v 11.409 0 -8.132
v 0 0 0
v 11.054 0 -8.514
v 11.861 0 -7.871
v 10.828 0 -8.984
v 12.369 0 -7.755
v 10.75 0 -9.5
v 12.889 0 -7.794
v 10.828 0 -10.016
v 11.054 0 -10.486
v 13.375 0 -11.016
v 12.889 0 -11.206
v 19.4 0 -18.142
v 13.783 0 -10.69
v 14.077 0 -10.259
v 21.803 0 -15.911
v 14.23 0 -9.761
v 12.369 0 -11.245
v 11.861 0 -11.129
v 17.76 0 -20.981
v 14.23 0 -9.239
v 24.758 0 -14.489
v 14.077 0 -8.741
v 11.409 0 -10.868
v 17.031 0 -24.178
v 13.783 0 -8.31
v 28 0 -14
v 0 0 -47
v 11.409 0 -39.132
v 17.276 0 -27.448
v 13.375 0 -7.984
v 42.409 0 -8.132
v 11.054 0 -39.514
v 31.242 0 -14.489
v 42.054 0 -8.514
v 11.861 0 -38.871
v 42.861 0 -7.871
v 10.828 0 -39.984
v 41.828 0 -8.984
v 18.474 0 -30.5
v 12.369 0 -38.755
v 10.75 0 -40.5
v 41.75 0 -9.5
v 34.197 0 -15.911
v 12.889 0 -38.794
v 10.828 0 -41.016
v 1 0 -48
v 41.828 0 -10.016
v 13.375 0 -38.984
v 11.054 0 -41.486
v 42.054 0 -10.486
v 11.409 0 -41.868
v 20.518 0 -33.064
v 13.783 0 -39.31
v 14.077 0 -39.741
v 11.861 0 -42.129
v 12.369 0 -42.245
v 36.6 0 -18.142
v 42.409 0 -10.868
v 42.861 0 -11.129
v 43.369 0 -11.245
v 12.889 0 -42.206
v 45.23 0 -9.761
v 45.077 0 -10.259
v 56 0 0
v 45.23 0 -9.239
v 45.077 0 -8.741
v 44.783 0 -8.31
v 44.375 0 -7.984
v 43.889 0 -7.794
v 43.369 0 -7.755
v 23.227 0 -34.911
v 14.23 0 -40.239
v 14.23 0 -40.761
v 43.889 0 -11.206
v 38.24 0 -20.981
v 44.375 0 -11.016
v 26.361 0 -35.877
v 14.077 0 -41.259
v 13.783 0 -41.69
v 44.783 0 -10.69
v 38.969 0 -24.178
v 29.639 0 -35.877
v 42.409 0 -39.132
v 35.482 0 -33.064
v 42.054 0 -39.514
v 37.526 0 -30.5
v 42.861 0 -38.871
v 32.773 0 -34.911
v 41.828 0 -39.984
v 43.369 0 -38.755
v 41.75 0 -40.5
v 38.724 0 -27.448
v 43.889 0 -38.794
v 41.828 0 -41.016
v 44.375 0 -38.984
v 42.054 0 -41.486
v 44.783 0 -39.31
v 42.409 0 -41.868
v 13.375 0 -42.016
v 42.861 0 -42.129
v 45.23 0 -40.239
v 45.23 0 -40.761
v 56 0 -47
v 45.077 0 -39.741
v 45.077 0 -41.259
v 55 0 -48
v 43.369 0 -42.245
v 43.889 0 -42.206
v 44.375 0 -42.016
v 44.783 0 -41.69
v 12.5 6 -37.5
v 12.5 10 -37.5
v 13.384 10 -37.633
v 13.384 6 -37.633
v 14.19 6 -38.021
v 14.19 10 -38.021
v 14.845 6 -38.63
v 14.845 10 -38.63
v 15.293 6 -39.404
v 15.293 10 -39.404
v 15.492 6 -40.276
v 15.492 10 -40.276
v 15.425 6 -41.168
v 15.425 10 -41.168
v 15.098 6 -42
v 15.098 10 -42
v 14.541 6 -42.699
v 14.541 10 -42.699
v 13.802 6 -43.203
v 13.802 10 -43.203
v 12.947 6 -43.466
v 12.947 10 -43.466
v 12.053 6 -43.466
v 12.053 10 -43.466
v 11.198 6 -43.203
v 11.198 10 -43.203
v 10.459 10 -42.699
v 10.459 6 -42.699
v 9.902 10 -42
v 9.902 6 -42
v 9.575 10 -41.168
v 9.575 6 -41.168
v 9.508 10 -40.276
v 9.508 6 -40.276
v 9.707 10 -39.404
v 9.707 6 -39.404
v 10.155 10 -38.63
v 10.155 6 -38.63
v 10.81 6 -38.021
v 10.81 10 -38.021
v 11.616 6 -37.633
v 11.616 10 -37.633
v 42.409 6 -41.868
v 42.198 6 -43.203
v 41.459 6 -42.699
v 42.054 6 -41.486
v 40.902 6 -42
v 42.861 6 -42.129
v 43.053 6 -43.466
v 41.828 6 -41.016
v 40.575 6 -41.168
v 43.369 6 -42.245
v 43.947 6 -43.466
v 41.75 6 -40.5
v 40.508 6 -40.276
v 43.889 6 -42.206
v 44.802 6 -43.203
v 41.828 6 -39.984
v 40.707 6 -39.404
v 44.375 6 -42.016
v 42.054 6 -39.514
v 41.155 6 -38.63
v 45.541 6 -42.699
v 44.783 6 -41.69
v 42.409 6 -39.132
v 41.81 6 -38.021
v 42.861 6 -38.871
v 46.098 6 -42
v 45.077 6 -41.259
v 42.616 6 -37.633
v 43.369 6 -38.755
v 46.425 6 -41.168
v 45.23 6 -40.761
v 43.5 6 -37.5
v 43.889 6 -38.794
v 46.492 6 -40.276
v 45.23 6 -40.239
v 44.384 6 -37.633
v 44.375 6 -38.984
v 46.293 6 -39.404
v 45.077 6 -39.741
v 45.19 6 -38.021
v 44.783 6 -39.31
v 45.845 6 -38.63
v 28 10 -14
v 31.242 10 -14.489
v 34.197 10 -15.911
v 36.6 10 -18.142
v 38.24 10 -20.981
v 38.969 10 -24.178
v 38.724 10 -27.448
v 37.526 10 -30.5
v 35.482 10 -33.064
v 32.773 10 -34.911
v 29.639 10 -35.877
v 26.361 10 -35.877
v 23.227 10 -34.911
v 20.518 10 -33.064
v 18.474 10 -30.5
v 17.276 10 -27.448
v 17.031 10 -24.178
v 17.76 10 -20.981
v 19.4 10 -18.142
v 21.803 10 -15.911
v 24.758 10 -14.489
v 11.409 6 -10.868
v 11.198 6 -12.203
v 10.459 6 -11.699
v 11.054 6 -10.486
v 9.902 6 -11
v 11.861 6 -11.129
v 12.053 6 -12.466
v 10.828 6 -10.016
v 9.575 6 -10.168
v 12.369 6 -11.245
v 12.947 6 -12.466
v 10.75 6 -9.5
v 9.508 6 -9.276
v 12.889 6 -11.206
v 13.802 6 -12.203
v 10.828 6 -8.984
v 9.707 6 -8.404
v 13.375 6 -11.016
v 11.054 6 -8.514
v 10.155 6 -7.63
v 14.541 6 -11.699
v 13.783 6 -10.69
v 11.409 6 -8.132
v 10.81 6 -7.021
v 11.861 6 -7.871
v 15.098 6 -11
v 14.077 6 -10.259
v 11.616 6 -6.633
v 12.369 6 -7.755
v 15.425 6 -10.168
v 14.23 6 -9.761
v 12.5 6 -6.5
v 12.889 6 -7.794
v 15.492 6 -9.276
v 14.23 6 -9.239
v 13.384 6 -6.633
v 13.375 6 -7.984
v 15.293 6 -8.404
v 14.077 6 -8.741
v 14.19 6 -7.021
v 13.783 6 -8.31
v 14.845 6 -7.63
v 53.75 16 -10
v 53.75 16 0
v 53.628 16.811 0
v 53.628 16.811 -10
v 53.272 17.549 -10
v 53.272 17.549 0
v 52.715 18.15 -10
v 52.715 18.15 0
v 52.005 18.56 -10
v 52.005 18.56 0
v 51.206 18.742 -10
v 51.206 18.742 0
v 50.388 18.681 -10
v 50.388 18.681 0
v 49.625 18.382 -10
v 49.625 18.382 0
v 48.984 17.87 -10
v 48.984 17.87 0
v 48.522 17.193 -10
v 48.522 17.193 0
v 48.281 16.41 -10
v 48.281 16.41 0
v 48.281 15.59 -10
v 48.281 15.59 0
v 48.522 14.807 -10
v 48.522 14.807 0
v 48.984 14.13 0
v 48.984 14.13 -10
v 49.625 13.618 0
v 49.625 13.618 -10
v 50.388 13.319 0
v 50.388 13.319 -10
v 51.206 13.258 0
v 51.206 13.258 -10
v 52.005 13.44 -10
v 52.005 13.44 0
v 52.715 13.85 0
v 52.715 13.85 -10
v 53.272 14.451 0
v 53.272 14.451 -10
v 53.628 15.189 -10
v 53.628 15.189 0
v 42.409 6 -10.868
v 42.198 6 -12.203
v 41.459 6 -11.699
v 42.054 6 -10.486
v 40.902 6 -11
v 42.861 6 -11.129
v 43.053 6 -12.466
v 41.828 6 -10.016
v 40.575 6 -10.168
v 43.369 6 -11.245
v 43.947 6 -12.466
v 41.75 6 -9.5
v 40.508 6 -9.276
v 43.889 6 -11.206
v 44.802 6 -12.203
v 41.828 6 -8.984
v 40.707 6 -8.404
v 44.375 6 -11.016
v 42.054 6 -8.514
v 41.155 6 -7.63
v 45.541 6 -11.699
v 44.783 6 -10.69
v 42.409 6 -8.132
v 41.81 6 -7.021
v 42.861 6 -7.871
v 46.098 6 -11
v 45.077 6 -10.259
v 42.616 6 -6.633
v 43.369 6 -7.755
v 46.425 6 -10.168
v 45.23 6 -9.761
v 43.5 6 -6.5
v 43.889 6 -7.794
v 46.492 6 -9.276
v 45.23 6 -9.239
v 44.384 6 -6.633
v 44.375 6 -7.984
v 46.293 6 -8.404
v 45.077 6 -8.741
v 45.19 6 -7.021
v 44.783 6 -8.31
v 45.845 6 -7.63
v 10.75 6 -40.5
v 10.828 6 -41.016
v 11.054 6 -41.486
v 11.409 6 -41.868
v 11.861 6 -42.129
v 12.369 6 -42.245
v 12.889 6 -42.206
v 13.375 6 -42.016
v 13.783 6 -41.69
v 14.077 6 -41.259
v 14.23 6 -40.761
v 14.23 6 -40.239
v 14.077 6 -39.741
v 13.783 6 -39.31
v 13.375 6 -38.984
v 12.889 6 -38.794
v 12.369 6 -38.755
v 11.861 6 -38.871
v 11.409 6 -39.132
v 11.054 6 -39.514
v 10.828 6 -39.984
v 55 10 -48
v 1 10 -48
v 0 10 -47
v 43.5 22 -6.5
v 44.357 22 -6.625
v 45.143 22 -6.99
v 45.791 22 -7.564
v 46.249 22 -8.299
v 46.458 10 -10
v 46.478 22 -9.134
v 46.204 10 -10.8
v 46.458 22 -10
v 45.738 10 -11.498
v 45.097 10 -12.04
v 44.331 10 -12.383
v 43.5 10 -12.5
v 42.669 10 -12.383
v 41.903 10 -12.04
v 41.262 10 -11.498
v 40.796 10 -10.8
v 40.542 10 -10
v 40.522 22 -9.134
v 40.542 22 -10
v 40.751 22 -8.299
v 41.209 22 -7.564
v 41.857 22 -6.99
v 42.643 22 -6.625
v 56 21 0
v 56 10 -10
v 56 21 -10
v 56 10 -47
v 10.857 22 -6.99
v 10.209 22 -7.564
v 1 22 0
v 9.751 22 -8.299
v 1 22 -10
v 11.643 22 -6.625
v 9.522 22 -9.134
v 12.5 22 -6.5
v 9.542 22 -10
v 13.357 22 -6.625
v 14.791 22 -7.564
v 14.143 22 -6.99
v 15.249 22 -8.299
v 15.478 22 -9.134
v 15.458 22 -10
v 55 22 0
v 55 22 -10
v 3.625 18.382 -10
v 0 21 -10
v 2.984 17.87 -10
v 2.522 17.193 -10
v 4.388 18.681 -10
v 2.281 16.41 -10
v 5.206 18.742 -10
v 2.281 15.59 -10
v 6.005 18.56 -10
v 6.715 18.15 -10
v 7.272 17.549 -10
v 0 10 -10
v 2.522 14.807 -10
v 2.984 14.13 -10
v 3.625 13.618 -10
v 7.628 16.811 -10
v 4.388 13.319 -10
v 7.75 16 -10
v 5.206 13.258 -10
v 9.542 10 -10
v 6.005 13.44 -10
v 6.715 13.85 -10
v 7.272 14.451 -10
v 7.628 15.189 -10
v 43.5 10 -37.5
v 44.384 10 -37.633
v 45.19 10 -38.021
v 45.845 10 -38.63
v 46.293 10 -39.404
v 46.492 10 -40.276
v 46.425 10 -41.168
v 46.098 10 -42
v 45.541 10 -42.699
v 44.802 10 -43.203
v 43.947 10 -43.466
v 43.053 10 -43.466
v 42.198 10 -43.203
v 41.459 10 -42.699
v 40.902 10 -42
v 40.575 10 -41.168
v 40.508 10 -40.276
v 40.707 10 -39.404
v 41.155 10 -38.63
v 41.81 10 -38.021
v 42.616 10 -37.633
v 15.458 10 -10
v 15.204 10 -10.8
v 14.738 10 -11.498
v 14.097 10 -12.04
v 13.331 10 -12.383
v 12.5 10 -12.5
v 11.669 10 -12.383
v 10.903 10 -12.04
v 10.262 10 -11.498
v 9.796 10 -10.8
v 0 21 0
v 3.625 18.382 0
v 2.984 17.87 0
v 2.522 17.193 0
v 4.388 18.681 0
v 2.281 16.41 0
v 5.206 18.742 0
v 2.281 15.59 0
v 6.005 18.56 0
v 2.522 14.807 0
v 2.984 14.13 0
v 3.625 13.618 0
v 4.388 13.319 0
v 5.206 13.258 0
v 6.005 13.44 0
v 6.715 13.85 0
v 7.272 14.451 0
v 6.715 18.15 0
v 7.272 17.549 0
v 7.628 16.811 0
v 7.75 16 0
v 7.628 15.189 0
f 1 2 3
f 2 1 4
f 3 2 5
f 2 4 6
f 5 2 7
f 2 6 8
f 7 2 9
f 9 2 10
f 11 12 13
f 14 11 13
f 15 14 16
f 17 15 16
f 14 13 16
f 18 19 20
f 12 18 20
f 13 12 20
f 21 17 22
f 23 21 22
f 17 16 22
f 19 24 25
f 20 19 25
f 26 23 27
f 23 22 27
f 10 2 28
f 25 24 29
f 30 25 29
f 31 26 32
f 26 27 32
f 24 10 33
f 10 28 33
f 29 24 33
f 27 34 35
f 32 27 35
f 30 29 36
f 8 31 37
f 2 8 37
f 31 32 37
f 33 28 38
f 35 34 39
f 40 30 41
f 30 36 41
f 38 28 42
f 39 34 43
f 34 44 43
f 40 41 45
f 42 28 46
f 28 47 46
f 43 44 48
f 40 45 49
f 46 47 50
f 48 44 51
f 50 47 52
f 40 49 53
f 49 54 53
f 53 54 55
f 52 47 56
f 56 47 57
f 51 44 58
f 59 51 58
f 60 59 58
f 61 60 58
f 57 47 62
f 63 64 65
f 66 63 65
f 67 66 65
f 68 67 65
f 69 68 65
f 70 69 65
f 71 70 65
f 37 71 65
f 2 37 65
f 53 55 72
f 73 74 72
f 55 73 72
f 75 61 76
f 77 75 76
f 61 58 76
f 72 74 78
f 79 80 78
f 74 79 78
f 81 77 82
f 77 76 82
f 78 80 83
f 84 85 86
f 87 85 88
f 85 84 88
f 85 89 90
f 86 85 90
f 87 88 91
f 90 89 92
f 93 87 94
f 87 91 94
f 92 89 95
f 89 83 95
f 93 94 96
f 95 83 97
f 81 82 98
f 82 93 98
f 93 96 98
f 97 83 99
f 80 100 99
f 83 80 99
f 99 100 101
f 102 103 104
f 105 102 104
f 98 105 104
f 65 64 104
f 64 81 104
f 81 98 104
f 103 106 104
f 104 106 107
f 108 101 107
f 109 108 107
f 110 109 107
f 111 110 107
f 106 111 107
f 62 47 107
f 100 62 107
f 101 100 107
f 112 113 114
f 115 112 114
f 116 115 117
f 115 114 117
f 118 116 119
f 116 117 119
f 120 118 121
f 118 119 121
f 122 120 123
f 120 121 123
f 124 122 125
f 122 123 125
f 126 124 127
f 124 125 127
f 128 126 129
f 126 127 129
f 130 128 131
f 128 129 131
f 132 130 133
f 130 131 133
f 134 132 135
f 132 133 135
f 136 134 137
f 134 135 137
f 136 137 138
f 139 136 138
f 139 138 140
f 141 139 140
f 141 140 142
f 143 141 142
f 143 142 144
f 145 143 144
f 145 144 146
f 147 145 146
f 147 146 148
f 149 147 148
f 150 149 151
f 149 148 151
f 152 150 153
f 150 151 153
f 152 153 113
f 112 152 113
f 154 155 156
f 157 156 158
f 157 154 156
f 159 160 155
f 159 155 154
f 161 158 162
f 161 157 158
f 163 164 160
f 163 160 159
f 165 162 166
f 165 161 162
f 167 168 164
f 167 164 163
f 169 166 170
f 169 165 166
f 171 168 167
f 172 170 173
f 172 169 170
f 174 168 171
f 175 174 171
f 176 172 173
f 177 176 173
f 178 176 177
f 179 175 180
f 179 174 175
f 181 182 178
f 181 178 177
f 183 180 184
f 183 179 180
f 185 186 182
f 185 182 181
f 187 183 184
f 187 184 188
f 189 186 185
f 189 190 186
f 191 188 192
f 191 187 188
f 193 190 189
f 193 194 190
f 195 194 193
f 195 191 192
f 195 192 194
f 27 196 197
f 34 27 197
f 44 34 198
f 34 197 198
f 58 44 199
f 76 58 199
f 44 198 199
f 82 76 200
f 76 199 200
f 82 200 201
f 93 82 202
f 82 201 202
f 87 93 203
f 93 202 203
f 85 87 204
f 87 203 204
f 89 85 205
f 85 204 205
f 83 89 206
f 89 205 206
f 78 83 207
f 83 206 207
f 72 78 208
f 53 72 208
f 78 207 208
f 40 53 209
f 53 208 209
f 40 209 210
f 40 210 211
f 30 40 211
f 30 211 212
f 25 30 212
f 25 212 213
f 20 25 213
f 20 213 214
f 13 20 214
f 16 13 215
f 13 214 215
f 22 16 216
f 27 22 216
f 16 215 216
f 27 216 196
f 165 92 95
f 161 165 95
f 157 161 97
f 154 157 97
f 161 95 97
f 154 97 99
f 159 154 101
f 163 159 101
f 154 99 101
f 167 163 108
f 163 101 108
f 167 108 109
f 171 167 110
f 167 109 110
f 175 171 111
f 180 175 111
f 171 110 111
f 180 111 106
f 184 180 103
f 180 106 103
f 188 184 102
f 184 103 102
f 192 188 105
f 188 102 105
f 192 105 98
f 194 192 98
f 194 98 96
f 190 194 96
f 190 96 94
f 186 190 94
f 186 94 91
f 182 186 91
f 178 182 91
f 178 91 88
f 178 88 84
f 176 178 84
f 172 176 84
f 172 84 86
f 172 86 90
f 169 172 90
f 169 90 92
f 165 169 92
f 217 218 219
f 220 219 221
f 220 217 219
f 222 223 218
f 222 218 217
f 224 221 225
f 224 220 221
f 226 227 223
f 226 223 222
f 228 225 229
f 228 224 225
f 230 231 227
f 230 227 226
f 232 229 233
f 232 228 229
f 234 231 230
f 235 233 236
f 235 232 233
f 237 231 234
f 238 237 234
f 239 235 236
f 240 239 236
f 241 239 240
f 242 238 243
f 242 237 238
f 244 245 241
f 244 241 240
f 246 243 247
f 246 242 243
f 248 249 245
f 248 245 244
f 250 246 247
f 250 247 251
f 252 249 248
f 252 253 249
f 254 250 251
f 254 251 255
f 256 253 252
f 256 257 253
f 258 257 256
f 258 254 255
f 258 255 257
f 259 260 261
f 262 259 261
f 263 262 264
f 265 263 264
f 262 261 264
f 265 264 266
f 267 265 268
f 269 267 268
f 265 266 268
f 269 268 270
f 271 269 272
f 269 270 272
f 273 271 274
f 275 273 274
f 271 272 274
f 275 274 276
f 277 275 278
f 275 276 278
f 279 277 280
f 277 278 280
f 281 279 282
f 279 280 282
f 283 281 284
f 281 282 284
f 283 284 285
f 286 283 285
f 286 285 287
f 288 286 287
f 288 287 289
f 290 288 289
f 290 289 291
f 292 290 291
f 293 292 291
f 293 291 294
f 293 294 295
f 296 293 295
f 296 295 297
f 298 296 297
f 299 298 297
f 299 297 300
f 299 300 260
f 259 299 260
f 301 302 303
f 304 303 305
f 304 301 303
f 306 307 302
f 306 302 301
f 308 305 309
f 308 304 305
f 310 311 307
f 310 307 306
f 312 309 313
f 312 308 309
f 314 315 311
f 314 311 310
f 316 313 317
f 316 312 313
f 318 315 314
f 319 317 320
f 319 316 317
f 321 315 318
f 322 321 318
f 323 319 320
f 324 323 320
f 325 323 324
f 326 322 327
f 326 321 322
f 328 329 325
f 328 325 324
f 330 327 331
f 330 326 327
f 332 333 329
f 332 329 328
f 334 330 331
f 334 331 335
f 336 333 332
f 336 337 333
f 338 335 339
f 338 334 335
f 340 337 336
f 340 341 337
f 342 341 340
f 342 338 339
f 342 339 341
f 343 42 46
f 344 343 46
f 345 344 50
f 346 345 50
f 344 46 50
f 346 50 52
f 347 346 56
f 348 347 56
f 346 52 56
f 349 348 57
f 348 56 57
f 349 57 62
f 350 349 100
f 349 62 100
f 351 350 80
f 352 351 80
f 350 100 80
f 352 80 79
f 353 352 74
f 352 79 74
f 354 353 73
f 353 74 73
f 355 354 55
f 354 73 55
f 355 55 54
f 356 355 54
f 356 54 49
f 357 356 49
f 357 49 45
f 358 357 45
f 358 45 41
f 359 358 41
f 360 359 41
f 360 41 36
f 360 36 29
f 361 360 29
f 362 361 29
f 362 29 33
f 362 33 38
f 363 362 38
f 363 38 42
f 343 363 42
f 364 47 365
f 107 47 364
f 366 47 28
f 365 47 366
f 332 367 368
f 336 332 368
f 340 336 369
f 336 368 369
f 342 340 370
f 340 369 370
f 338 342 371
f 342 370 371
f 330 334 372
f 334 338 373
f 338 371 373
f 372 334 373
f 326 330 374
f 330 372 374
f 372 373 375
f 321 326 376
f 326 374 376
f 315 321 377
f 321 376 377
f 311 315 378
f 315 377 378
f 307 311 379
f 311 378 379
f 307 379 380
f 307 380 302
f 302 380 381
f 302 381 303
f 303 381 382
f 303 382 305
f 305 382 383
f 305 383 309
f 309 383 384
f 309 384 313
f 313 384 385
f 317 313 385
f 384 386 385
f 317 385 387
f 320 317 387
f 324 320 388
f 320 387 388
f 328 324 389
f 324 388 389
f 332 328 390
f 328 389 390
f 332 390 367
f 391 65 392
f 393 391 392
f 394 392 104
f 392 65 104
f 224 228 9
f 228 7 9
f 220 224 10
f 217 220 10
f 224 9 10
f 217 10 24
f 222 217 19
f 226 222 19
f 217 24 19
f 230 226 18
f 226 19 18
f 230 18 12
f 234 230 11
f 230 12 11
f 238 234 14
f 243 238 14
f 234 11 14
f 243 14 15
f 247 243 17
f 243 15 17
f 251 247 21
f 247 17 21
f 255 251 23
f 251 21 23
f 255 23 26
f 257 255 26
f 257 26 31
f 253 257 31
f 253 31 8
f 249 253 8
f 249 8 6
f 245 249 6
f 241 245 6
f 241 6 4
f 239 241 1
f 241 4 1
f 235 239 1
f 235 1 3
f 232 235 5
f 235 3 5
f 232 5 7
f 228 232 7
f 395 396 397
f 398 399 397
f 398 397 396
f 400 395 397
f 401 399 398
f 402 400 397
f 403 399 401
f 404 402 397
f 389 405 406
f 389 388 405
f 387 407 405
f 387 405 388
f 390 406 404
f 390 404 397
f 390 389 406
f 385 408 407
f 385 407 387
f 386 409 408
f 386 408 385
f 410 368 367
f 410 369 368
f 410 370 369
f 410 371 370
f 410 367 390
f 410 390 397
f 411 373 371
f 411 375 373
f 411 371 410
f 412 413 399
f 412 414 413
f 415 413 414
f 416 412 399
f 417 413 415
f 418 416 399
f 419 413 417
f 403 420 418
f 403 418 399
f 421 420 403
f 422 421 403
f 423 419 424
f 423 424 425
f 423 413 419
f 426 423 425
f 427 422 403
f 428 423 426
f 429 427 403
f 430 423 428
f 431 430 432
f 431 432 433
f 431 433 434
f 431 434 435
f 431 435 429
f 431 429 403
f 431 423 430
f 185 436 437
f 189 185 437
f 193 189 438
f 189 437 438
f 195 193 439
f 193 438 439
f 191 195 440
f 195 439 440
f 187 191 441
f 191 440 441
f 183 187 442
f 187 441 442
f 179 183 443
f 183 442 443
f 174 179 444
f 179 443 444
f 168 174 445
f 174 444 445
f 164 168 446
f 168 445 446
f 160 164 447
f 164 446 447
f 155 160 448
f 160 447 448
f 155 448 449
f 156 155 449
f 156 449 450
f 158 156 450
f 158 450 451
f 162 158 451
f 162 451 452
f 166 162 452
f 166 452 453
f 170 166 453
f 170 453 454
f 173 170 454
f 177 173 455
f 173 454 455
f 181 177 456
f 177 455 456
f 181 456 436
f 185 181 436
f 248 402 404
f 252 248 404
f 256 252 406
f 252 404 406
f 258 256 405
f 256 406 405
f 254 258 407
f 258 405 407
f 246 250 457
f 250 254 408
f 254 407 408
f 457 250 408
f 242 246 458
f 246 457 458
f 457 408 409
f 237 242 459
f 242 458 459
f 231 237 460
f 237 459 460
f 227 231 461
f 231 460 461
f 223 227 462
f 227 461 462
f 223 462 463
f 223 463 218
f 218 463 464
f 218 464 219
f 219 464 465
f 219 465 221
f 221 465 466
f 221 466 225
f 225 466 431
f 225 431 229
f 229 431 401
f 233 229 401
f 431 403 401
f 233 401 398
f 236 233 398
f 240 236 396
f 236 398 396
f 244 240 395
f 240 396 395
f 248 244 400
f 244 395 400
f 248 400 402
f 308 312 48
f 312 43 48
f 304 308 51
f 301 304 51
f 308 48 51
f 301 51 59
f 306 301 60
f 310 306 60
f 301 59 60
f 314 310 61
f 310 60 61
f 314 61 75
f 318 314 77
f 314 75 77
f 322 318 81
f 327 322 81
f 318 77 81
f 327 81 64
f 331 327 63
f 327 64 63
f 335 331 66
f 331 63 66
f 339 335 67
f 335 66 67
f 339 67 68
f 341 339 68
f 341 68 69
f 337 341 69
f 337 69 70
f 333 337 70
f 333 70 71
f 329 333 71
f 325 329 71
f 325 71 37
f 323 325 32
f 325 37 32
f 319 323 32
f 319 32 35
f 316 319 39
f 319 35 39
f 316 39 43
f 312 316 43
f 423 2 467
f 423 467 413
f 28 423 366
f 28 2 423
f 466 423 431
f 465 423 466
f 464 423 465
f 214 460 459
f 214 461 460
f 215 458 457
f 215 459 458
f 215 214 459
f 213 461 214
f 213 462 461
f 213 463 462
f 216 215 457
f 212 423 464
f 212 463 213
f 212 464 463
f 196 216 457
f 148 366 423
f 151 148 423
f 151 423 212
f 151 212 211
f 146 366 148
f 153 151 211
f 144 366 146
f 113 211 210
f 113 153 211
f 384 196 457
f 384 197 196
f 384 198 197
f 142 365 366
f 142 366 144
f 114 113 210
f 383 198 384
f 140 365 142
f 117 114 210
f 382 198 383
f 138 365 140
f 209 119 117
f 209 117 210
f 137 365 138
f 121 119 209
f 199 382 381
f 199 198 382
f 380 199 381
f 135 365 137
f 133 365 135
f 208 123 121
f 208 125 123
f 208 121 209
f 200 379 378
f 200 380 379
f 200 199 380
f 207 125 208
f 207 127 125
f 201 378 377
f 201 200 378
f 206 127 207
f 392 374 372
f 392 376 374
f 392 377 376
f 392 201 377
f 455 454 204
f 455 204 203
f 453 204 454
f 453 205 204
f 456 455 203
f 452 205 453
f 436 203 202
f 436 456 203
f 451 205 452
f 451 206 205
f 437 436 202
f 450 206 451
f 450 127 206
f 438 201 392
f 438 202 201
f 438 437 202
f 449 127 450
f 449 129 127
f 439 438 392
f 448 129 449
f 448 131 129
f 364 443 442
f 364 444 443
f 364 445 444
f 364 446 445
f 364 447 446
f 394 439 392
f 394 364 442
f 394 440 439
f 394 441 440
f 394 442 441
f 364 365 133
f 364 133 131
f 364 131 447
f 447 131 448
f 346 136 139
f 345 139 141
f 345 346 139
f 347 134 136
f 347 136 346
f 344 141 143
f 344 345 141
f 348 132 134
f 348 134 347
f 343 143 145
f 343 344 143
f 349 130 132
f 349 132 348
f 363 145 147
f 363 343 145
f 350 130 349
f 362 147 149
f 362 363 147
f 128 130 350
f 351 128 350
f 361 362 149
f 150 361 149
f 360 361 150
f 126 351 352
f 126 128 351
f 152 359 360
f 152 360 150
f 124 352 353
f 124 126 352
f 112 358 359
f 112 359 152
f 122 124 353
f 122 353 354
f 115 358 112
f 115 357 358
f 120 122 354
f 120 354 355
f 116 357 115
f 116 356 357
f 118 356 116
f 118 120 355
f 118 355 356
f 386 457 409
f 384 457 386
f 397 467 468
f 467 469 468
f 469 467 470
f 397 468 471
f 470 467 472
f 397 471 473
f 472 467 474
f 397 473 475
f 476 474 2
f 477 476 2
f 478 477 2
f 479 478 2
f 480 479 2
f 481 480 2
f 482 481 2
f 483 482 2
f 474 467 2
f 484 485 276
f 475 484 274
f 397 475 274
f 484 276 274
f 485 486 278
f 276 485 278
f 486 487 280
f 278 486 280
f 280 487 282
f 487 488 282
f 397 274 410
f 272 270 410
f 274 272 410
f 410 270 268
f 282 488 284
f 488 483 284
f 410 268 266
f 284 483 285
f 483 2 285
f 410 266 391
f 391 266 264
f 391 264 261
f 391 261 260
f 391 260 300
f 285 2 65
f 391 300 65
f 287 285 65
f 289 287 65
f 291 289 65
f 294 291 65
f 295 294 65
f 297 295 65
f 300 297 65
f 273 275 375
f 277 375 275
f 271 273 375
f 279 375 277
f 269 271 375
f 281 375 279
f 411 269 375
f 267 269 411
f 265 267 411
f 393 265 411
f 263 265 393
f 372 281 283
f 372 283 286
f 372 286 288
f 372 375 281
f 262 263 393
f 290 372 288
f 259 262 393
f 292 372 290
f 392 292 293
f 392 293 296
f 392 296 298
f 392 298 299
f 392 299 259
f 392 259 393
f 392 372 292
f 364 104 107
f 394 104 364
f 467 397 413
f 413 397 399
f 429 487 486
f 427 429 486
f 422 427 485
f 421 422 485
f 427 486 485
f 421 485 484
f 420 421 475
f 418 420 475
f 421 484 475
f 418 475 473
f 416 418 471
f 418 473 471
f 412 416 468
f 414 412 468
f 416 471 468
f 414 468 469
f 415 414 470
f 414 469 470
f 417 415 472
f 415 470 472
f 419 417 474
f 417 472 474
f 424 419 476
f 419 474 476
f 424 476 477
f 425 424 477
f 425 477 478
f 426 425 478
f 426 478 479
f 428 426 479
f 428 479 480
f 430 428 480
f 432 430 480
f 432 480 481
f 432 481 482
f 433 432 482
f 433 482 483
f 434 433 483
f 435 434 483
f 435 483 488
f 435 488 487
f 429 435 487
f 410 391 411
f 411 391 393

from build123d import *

# Parameters (mm, degrees)
SKETCH_1_W              = 56
SKETCH_1_H              = 48
EXTRUDE_1_DEPTH         = 10
SKETCH_2_R              = 11
CUT_EXTRUDE_1_DEPTH     = 10
HOLE_WIZARD_3_5_3_5_1_D = 3.5
SKETCH_8_W              = 56
SKETCH_8_H              = 10
EXTRUDE_2_DEPTH         = 12
HOLE_WIZARD_5_5_5_5_1_D = 5.5
SKETCH_11_R             = 3
CUT_EXTRUDE_2_DEPTH     = 16
SKETCH_13_R             = 3
CUT_EXTRUDE_3_DEPTH     = 4
CHAMFER_1_SIZE          = 1
CHAMFER_2_SIZE          = 1


with BuildPart() as part:
    # 草图1 → 凸台-拉伸1 (new body)
    with BuildSketch(Plane(origin=(0, 0, 0), x_dir=(1, 0, 0), z_dir=(0, 1, 0))):
        with Locations((28, 24)):
            Rectangle(SKETCH_1_W, SKETCH_1_H)
    extrude(amount=EXTRUDE_1_DEPTH)

    # 草图2 → 切除-拉伸1 (cut)
    with BuildSketch(Plane(origin=(0, 10, 0), x_dir=(1, 0, 0), z_dir=(0, 1, 0))):
        with Locations(Location((28, 25, 0), (0, 0, 270))):
            Circle(SKETCH_2_R)
    extrude(amount=-CUT_EXTRUDE_1_DEPTH, mode=Mode.SUBTRACT)

    # Ø3.5 (3.5) 直径孔1 (through all)
    with Locations(Plane(origin=(0, 10, 0), x_dir=(1, 0, 0), z_dir=(0, 1, 0))):
        with Locations((12.5, 40.5), (43.5, 40.5), (43.5, 9.5), (12.5, 9.5)):
            Hole(HOLE_WIZARD_3_5_3_5_1_D / 2)

    # 草图8 → 凸台-拉伸2 (add)
    with BuildSketch(Plane(origin=(0, 10, 0), x_dir=(1, 0, 0), z_dir=(0, 1, 0))):
        with Locations((28, 5)):
            Rectangle(SKETCH_8_W, SKETCH_8_H)
    extrude(amount=EXTRUDE_2_DEPTH)

    # Ø5.5 (5.5) 直径孔1 (through all)
    with Locations(Plane(origin=(0, 0, -10), x_dir=(-1, 0, 0), z_dir=(0, 0, -1))):
        with Locations((-51, 16), (-5, 16)):
            Hole(HOLE_WIZARD_5_5_5_5_1_D / 2)

    # 草图11 → 切除-拉伸2 (cut)
    with BuildSketch(Plane(origin=(0, 22, 0), x_dir=(1, 0, 0), z_dir=(0, 1, 0))):
        with Locations(Location((12.5, 9.5, 0), (0, 0, 270))):
            Circle(SKETCH_11_R)
        with Locations(Location((43.5, 9.5, 0), (0, 0, 270))):
            Circle(SKETCH_11_R)
    extrude(amount=-CUT_EXTRUDE_2_DEPTH, mode=Mode.SUBTRACT)

    # 草图13 → 切除-拉伸3 (cut)
    with BuildSketch(Plane(origin=(0, 10, 0), x_dir=(1, 0, 0), z_dir=(0, 1, 0))):
        with Locations(Location((12.5, 40.5, 0), (0, 0, 270))):
            Circle(SKETCH_13_R)
        with Locations(Location((43.5, 40.5, 0), (0, 0, 270))):
            Circle(SKETCH_13_R)
    extrude(amount=-CUT_EXTRUDE_3_DEPTH, mode=Mode.SUBTRACT)

    # 倒角1
    chamfer_1_edges = [part.edges().sort_by_distance(p)[0] for p in [
        (56, 5, -48),
        (0, 5, -48),
    ]]
    chamfer(chamfer_1_edges, length=CHAMFER_1_SIZE)

    # 倒角2
    chamfer_2_edges = [part.edges().sort_by_distance(p)[0] for p in [
        (56, 22, -5),
        (0, 22, -5),
    ]]
    chamfer(chamfer_2_edges, length=CHAMFER_2_SIZE)


solid = part.part
